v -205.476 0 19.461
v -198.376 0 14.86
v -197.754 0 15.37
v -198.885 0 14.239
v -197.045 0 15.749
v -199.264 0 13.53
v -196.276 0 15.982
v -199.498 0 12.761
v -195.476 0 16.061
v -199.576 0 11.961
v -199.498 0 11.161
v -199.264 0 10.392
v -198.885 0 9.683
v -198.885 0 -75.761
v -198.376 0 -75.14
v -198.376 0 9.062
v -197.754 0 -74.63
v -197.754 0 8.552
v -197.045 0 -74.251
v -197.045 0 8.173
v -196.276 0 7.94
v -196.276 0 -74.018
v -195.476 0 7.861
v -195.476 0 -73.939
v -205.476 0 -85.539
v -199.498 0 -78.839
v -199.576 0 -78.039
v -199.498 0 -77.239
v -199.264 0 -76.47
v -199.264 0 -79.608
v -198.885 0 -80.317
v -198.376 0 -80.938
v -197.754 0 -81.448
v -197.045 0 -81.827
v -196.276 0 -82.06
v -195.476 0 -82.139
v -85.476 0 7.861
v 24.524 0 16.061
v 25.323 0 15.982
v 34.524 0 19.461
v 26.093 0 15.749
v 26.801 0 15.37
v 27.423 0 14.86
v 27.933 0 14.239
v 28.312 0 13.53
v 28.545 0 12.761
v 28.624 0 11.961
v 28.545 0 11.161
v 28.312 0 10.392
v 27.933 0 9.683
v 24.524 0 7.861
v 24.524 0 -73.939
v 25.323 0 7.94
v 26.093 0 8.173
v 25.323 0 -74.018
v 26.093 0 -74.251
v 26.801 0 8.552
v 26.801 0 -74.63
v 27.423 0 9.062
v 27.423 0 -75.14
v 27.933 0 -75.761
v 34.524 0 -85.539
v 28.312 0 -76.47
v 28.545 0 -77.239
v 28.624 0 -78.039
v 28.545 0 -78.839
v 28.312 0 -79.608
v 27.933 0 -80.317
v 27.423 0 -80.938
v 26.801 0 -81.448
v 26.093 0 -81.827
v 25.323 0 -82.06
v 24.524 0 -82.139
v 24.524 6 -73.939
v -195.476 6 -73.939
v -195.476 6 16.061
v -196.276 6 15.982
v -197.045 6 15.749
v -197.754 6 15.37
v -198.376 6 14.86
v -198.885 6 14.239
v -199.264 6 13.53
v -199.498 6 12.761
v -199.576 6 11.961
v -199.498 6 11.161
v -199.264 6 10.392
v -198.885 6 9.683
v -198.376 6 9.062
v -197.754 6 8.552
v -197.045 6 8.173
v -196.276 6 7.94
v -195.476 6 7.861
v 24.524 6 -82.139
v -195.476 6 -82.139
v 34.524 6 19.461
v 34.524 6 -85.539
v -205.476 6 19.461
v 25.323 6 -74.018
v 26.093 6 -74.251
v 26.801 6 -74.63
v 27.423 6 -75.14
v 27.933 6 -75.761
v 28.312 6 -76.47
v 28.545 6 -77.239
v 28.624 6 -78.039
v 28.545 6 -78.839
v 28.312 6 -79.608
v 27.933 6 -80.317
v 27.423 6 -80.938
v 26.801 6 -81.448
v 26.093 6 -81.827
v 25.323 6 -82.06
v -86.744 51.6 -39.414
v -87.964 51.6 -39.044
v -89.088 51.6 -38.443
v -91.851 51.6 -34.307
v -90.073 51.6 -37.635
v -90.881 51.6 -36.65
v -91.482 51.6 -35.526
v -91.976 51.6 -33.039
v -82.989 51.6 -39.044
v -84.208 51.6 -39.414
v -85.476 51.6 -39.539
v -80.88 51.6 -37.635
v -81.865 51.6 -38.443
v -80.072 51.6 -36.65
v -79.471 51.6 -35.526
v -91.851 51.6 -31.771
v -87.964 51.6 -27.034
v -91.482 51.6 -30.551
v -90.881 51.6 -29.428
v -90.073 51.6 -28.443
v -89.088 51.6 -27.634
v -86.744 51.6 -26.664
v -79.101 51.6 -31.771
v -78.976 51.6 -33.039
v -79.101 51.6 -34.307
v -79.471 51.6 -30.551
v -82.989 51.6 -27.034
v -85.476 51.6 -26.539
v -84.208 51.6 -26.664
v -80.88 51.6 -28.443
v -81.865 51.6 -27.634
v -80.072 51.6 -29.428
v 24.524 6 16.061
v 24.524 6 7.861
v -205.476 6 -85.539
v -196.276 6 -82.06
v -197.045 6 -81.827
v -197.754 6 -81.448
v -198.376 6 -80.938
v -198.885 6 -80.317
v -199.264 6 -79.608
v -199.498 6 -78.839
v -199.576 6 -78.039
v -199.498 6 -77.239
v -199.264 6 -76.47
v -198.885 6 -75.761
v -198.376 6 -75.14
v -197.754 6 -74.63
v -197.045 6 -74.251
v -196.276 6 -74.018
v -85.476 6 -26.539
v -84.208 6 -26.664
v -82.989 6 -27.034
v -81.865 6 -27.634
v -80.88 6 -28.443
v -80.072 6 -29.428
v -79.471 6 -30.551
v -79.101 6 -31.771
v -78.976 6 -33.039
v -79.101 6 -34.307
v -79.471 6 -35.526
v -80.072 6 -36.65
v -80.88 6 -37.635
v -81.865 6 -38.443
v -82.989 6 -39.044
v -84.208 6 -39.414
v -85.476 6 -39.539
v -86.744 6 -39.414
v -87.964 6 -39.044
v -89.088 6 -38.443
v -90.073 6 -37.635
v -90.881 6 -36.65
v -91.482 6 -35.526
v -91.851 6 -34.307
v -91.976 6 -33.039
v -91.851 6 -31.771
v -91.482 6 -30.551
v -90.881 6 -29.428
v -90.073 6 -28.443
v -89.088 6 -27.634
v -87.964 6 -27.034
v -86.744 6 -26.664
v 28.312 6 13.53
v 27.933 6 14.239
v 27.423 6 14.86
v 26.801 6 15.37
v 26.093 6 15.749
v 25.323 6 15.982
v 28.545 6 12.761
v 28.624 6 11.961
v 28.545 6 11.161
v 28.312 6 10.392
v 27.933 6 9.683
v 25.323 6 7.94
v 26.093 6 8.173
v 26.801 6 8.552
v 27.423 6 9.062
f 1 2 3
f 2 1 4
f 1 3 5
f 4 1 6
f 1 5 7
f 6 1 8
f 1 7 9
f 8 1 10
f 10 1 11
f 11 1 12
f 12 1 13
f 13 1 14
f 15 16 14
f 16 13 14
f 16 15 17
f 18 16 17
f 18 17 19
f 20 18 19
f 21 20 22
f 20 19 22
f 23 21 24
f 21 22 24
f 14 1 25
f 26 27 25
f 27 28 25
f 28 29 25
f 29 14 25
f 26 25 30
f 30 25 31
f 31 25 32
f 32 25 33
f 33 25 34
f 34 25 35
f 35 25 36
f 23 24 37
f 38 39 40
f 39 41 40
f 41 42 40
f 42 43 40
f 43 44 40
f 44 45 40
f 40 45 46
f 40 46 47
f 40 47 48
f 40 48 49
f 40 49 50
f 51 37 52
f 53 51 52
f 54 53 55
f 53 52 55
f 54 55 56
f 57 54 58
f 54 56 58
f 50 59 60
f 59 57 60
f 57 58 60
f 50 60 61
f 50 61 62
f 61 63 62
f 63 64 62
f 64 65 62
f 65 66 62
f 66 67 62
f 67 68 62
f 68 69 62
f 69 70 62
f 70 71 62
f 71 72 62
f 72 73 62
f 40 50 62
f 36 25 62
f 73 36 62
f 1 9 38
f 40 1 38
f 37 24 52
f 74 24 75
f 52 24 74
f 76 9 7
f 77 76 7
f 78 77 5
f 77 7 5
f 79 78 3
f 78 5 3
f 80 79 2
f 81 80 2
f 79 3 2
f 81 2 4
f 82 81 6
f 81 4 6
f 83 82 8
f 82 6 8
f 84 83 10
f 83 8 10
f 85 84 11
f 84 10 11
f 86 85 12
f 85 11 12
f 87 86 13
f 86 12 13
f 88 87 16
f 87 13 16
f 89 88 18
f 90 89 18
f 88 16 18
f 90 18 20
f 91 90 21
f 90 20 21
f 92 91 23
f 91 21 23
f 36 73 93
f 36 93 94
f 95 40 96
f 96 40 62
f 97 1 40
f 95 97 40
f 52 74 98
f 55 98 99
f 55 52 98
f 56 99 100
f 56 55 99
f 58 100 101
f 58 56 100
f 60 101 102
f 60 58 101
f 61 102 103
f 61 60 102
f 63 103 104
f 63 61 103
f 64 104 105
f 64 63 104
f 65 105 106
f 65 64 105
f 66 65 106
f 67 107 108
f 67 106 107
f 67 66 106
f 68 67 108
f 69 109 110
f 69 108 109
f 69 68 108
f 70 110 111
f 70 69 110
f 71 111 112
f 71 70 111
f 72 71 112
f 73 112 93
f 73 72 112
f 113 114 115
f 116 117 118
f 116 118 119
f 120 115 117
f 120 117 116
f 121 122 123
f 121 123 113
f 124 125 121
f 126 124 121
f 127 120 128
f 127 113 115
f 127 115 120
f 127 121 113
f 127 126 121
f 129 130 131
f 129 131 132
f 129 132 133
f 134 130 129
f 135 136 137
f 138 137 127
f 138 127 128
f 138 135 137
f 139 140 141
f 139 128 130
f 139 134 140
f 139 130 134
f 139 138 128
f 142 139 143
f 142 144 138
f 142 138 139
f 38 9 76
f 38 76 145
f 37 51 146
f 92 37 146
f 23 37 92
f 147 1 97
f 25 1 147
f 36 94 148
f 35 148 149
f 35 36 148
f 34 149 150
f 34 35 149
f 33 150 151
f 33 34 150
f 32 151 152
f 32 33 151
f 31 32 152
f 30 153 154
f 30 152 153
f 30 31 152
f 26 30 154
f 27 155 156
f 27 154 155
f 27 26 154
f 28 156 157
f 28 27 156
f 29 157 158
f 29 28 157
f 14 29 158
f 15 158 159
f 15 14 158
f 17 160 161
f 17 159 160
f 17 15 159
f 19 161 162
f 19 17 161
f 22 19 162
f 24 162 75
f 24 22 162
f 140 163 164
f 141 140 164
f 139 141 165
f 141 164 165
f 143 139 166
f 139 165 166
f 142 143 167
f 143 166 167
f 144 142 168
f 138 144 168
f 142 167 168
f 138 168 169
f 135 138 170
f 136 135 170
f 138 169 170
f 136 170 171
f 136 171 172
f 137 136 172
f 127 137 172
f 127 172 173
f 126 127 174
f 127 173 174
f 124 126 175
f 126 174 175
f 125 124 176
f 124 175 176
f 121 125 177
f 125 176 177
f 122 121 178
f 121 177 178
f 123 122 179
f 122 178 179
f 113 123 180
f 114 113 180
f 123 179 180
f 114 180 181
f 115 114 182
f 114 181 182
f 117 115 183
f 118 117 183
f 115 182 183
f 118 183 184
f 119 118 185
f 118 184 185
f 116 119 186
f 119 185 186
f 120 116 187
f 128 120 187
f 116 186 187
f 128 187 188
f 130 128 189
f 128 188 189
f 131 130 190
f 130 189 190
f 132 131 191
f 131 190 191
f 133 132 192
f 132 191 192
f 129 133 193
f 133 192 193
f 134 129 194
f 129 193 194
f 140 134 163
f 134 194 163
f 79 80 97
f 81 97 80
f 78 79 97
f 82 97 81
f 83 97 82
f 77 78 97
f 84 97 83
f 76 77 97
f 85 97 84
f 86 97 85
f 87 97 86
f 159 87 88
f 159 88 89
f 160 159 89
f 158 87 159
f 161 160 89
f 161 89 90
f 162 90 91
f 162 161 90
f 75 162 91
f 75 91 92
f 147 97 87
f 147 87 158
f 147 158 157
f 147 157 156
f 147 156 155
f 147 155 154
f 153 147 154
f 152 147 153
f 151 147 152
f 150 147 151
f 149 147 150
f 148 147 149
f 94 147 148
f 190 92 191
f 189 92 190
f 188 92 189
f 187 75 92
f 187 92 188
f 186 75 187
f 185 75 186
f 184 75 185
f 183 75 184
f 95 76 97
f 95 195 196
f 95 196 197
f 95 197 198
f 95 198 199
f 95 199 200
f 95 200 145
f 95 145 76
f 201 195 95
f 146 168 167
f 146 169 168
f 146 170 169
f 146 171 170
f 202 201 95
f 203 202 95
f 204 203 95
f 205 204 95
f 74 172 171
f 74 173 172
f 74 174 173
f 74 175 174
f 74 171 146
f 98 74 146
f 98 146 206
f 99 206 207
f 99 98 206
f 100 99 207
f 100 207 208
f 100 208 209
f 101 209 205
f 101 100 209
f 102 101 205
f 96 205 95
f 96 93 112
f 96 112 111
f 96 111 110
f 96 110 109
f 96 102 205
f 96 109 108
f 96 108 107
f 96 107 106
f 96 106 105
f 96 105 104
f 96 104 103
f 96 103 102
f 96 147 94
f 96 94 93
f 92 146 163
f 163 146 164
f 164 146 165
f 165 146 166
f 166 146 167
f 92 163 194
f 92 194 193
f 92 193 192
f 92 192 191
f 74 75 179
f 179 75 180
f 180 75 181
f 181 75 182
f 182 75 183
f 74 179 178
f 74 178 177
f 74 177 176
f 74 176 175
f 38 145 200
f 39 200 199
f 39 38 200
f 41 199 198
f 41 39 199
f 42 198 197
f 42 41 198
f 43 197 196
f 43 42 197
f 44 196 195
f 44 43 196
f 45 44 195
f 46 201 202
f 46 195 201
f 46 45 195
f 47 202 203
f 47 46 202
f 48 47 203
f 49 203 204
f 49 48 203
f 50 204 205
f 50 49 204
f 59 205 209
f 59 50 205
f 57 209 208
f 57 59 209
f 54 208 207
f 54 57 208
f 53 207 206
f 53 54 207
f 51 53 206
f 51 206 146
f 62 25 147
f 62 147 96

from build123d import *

# Parameters (mm, degrees)
SKETCH_2_W                       = 240
SKETCH_2_H                       = 105
EXTRUDE_1_DEPTH                  = 6
SKETCH_22_R                      = 4.1
CUT_EXTRUDE_3_DEPTH              = 223.650914893
PATTERN_LINEAR_2_COUNT           = 5
PATTERN_LINEAR_2_PITCH           = 55
PATTERN_LINEAR_3_COPY_1_SKETCH_R = 4.1
PATTERN_LINEAR_3_COPY_1_DEPTH    = 223.650914893
PATTERN_LINEAR_3_COPY_2_SKETCH_R = 4.1
PATTERN_LINEAR_3_COPY_2_DEPTH    = 223.650914893
PATTERN_LINEAR_3_COPY_3_SKETCH_R = 4.1
PATTERN_LINEAR_3_COPY_3_DEPTH    = 223.650914893
PATTERN_LINEAR_3_COPY_4_SKETCH_R = 4.1
PATTERN_LINEAR_3_COPY_4_DEPTH    = 223.650914893
PATTERN_LINEAR_3_COPY_5_SKETCH_R = 4.1
PATTERN_LINEAR_3_COPY_5_DEPTH    = 223.650914893
PATTERN_LINEAR_3_COPY_6_SKETCH_R = 4.1
PATTERN_LINEAR_3_COPY_6_DEPTH    = 223.650914893
PATTERN_LINEAR_3_COPY_7_SKETCH_R = 4.1
PATTERN_LINEAR_3_COPY_7_DEPTH    = 223.650914893
PATTERN_LINEAR_3_COPY_8_SKETCH_R = 4.1
PATTERN_LINEAR_3_COPY_8_DEPTH    = 223.650914893
SKETCH_18_R                      = 6.5
EXTRUDE_5_DEPTH                  = 45.6
SKETCH_25_W                      = 110
SKETCH_25_H                      = 8.2
CUT_EXTRUDE_4_DEPTH              = 229.473171078
MIRROR_27_COPY_1_SKETCH_W        = 110
MIRROR_27_COPY_1_SKETCH_H        = 8.2
MIRROR_27_COPY_1_DEPTH           = 229.473171078
MIRROR_27_COPY_2_SKETCH_W        = 110
MIRROR_27_COPY_2_SKETCH_H        = 8.2
MIRROR_27_COPY_2_DEPTH           = 229.473171078


with BuildPart() as part:
    # 草图2 → 凸台-拉伸1 (new body)
    with BuildSketch(Plane(origin=(0, 0, 0), x_dir=(1, 0, 0), z_dir=(0, 1, 0))):
        with Locations((-85.476378725, 33.038808084)):
            Rectangle(SKETCH_2_W, SKETCH_2_H)
    extrude(amount=EXTRUDE_1_DEPTH)

    # 草图22 → 切除-拉伸3 (cut, through all)
    with BuildSketch(Plane(origin=(0, 0, 0), x_dir=(1, 0, 0), z_dir=(0, 1, 0))):
        with Locations(Location((-195.476378725, 78.038808084, 0), (0, 0, 270))):
            Circle(SKETCH_22_R)
    cut_extrude_3 = extrude(amount=CUT_EXTRUDE_3_DEPTH, mode=Mode.SUBTRACT)

    # 镜向18: 切除-拉伸3 across plane
    add(cut_extrude_3.mirror(Plane.XY.offset(-33.038808084)), mode=Mode.SUBTRACT)

    # 阵列(线性)2: 切除-拉伸3 ×5
    with Locations(*[(i * PATTERN_LINEAR_2_PITCH, 0, 0) for i in range(1, PATTERN_LINEAR_2_COUNT)]):
        add(cut_extrude_3, mode=Mode.SUBTRACT)

    # 阵列(线性)3 copy 1 sketch → 阵列(线性)3 copy 1 (cut, through all)
    with BuildSketch(Plane(origin=(55, 0, -66.077616169), x_dir=(1, 0, 0), z_dir=(0, 1, 0))):
        with Locations((-195.476378725, -78.038808084)):
            Circle(PATTERN_LINEAR_3_COPY_1_SKETCH_R)
    extrude(amount=PATTERN_LINEAR_3_COPY_1_DEPTH, mode=Mode.SUBTRACT)

    # 阵列(线性)3 copy 2 sketch → 阵列(线性)3 copy 2 (cut, through all)
    with BuildSketch(Plane(origin=(110, 0, -66.077616169), x_dir=(1, 0, 0), z_dir=(0, 1, 0))):
        with Locations((-195.476378725, -78.038808084)):
            Circle(PATTERN_LINEAR_3_COPY_2_SKETCH_R)
    extrude(amount=PATTERN_LINEAR_3_COPY_2_DEPTH, mode=Mode.SUBTRACT)

    # 阵列(线性)3 copy 3 sketch → 阵列(线性)3 copy 3 (cut, through all)
    with BuildSketch(Plane(origin=(165, 0, -66.077616169), x_dir=(1, 0, 0), z_dir=(0, 1, 0))):
        with Locations((-195.476378725, -78.038808084)):
            Circle(PATTERN_LINEAR_3_COPY_3_SKETCH_R)
    extrude(amount=PATTERN_LINEAR_3_COPY_3_DEPTH, mode=Mode.SUBTRACT)

    # 阵列(线性)3 copy 4 sketch → 阵列(线性)3 copy 4 (cut, through all)
    with BuildSketch(Plane(origin=(220, 0, -66.077616169), x_dir=(1, 0, 0), z_dir=(0, 1, 0))):
        with Locations((-195.476378725, -78.038808084)):
            Circle(PATTERN_LINEAR_3_COPY_4_SKETCH_R)
    extrude(amount=PATTERN_LINEAR_3_COPY_4_DEPTH, mode=Mode.SUBTRACT)

    # 阵列(线性)3 copy 5 sketch → 阵列(线性)3 copy 5 (cut, through all)
    with BuildSketch(Plane(origin=(55, 0, 0), x_dir=(1, 0, 0), z_dir=(0, 1, 0))):
        with Locations(Location((-195.476378725, 78.038808084, 0), (0, 0, 270))):
            Circle(PATTERN_LINEAR_3_COPY_5_SKETCH_R)
    extrude(amount=PATTERN_LINEAR_3_COPY_5_DEPTH, mode=Mode.SUBTRACT)

    # 阵列(线性)3 copy 6 sketch → 阵列(线性)3 copy 6 (cut, through all)
    with BuildSketch(Plane(origin=(110, 0, 0), x_dir=(1, 0, 0), z_dir=(0, 1, 0))):
        with Locations(Location((-195.476378725, 78.038808084, 0), (0, 0, 270))):
            Circle(PATTERN_LINEAR_3_COPY_6_SKETCH_R)
    extrude(amount=PATTERN_LINEAR_3_COPY_6_DEPTH, mode=Mode.SUBTRACT)

    # 阵列(线性)3 copy 7 sketch → 阵列(线性)3 copy 7 (cut, through all)
    with BuildSketch(Plane(origin=(165, 0, 0), x_dir=(1, 0, 0), z_dir=(0, 1, 0))):
        with Locations(Location((-195.476378725, 78.038808084, 0), (0, 0, 270))):
            Circle(PATTERN_LINEAR_3_COPY_7_SKETCH_R)
    extrude(amount=PATTERN_LINEAR_3_COPY_7_DEPTH, mode=Mode.SUBTRACT)

    # 阵列(线性)3 copy 8 sketch → 阵列(线性)3 copy 8 (cut, through all)
    with BuildSketch(Plane(origin=(220, 0, 0), x_dir=(1, 0, 0), z_dir=(0, 1, 0))):
        with Locations(Location((-195.476378725, 78.038808084, 0), (0, 0, 270))):
            Circle(PATTERN_LINEAR_3_COPY_8_SKETCH_R)
    extrude(amount=PATTERN_LINEAR_3_COPY_8_DEPTH, mode=Mode.SUBTRACT)

    # 草图18 → 凸台-拉伸5 (add)
    with BuildSketch(Plane(origin=(0, 6, 0), x_dir=(1, 0, 0), z_dir=(0, 1, 0))):
        with Locations(Location((-85.476378725, 33.038808084, 0), (0, 0, 270))):
            Circle(SKETCH_18_R)
    extrude(amount=EXTRUDE_5_DEPTH)

    # 草图25 → 切除-拉伸4 (cut, through all)
    with BuildSketch(Plane(origin=(0, 0, 0), x_dir=(1, 0, 0), z_dir=(0, 1, 0))):
        with Locations((-140.476378725, 78.038808084)):
            Rectangle(SKETCH_25_W, SKETCH_25_H)
    cut_extrude_4 = extrude(amount=CUT_EXTRUDE_4_DEPTH, mode=Mode.SUBTRACT)

    # 镜向25: 切除-拉伸4 across plane
    add(cut_extrude_4.mirror(Plane.XY.offset(-33.038808084)), mode=Mode.SUBTRACT)

    # 镜向26: 切除-拉伸4 across plane
    add(cut_extrude_4.mirror(Plane(origin=(-85.476378725, 0, 0), x_dir=(0, 0, 1), z_dir=(1, 0, 0))), mode=Mode.SUBTRACT)

    # 镜向27 copy 1 sketch → 镜向27 copy 1 (cut, through all)
    with BuildSketch(Plane(origin=(-170.95275745, 0, -66.077616169), x_dir=(-1, 0, 0), z_dir=(0, 1, 0))):
        with Locations((-140.476378725, 78.038808084)):
            Rectangle(MIRROR_27_COPY_1_SKETCH_W, MIRROR_27_COPY_1_SKETCH_H)
    extrude(amount=MIRROR_27_COPY_1_DEPTH, mode=Mode.SUBTRACT)

    # 镜向27 copy 2 sketch → 镜向27 copy 2 (cut, through all)
    with BuildSketch(Plane(origin=(-170.95275745, 0, 0), x_dir=(-1, 0, 0), z_dir=(0, 1, 0))):
        with Locations((-140.476378725, -78.038808084)):
            Rectangle(MIRROR_27_COPY_2_SKETCH_W, MIRROR_27_COPY_2_SKETCH_H)
    extrude(amount=MIRROR_27_COPY_2_DEPTH, mode=Mode.SUBTRACT)


solid = part.part
